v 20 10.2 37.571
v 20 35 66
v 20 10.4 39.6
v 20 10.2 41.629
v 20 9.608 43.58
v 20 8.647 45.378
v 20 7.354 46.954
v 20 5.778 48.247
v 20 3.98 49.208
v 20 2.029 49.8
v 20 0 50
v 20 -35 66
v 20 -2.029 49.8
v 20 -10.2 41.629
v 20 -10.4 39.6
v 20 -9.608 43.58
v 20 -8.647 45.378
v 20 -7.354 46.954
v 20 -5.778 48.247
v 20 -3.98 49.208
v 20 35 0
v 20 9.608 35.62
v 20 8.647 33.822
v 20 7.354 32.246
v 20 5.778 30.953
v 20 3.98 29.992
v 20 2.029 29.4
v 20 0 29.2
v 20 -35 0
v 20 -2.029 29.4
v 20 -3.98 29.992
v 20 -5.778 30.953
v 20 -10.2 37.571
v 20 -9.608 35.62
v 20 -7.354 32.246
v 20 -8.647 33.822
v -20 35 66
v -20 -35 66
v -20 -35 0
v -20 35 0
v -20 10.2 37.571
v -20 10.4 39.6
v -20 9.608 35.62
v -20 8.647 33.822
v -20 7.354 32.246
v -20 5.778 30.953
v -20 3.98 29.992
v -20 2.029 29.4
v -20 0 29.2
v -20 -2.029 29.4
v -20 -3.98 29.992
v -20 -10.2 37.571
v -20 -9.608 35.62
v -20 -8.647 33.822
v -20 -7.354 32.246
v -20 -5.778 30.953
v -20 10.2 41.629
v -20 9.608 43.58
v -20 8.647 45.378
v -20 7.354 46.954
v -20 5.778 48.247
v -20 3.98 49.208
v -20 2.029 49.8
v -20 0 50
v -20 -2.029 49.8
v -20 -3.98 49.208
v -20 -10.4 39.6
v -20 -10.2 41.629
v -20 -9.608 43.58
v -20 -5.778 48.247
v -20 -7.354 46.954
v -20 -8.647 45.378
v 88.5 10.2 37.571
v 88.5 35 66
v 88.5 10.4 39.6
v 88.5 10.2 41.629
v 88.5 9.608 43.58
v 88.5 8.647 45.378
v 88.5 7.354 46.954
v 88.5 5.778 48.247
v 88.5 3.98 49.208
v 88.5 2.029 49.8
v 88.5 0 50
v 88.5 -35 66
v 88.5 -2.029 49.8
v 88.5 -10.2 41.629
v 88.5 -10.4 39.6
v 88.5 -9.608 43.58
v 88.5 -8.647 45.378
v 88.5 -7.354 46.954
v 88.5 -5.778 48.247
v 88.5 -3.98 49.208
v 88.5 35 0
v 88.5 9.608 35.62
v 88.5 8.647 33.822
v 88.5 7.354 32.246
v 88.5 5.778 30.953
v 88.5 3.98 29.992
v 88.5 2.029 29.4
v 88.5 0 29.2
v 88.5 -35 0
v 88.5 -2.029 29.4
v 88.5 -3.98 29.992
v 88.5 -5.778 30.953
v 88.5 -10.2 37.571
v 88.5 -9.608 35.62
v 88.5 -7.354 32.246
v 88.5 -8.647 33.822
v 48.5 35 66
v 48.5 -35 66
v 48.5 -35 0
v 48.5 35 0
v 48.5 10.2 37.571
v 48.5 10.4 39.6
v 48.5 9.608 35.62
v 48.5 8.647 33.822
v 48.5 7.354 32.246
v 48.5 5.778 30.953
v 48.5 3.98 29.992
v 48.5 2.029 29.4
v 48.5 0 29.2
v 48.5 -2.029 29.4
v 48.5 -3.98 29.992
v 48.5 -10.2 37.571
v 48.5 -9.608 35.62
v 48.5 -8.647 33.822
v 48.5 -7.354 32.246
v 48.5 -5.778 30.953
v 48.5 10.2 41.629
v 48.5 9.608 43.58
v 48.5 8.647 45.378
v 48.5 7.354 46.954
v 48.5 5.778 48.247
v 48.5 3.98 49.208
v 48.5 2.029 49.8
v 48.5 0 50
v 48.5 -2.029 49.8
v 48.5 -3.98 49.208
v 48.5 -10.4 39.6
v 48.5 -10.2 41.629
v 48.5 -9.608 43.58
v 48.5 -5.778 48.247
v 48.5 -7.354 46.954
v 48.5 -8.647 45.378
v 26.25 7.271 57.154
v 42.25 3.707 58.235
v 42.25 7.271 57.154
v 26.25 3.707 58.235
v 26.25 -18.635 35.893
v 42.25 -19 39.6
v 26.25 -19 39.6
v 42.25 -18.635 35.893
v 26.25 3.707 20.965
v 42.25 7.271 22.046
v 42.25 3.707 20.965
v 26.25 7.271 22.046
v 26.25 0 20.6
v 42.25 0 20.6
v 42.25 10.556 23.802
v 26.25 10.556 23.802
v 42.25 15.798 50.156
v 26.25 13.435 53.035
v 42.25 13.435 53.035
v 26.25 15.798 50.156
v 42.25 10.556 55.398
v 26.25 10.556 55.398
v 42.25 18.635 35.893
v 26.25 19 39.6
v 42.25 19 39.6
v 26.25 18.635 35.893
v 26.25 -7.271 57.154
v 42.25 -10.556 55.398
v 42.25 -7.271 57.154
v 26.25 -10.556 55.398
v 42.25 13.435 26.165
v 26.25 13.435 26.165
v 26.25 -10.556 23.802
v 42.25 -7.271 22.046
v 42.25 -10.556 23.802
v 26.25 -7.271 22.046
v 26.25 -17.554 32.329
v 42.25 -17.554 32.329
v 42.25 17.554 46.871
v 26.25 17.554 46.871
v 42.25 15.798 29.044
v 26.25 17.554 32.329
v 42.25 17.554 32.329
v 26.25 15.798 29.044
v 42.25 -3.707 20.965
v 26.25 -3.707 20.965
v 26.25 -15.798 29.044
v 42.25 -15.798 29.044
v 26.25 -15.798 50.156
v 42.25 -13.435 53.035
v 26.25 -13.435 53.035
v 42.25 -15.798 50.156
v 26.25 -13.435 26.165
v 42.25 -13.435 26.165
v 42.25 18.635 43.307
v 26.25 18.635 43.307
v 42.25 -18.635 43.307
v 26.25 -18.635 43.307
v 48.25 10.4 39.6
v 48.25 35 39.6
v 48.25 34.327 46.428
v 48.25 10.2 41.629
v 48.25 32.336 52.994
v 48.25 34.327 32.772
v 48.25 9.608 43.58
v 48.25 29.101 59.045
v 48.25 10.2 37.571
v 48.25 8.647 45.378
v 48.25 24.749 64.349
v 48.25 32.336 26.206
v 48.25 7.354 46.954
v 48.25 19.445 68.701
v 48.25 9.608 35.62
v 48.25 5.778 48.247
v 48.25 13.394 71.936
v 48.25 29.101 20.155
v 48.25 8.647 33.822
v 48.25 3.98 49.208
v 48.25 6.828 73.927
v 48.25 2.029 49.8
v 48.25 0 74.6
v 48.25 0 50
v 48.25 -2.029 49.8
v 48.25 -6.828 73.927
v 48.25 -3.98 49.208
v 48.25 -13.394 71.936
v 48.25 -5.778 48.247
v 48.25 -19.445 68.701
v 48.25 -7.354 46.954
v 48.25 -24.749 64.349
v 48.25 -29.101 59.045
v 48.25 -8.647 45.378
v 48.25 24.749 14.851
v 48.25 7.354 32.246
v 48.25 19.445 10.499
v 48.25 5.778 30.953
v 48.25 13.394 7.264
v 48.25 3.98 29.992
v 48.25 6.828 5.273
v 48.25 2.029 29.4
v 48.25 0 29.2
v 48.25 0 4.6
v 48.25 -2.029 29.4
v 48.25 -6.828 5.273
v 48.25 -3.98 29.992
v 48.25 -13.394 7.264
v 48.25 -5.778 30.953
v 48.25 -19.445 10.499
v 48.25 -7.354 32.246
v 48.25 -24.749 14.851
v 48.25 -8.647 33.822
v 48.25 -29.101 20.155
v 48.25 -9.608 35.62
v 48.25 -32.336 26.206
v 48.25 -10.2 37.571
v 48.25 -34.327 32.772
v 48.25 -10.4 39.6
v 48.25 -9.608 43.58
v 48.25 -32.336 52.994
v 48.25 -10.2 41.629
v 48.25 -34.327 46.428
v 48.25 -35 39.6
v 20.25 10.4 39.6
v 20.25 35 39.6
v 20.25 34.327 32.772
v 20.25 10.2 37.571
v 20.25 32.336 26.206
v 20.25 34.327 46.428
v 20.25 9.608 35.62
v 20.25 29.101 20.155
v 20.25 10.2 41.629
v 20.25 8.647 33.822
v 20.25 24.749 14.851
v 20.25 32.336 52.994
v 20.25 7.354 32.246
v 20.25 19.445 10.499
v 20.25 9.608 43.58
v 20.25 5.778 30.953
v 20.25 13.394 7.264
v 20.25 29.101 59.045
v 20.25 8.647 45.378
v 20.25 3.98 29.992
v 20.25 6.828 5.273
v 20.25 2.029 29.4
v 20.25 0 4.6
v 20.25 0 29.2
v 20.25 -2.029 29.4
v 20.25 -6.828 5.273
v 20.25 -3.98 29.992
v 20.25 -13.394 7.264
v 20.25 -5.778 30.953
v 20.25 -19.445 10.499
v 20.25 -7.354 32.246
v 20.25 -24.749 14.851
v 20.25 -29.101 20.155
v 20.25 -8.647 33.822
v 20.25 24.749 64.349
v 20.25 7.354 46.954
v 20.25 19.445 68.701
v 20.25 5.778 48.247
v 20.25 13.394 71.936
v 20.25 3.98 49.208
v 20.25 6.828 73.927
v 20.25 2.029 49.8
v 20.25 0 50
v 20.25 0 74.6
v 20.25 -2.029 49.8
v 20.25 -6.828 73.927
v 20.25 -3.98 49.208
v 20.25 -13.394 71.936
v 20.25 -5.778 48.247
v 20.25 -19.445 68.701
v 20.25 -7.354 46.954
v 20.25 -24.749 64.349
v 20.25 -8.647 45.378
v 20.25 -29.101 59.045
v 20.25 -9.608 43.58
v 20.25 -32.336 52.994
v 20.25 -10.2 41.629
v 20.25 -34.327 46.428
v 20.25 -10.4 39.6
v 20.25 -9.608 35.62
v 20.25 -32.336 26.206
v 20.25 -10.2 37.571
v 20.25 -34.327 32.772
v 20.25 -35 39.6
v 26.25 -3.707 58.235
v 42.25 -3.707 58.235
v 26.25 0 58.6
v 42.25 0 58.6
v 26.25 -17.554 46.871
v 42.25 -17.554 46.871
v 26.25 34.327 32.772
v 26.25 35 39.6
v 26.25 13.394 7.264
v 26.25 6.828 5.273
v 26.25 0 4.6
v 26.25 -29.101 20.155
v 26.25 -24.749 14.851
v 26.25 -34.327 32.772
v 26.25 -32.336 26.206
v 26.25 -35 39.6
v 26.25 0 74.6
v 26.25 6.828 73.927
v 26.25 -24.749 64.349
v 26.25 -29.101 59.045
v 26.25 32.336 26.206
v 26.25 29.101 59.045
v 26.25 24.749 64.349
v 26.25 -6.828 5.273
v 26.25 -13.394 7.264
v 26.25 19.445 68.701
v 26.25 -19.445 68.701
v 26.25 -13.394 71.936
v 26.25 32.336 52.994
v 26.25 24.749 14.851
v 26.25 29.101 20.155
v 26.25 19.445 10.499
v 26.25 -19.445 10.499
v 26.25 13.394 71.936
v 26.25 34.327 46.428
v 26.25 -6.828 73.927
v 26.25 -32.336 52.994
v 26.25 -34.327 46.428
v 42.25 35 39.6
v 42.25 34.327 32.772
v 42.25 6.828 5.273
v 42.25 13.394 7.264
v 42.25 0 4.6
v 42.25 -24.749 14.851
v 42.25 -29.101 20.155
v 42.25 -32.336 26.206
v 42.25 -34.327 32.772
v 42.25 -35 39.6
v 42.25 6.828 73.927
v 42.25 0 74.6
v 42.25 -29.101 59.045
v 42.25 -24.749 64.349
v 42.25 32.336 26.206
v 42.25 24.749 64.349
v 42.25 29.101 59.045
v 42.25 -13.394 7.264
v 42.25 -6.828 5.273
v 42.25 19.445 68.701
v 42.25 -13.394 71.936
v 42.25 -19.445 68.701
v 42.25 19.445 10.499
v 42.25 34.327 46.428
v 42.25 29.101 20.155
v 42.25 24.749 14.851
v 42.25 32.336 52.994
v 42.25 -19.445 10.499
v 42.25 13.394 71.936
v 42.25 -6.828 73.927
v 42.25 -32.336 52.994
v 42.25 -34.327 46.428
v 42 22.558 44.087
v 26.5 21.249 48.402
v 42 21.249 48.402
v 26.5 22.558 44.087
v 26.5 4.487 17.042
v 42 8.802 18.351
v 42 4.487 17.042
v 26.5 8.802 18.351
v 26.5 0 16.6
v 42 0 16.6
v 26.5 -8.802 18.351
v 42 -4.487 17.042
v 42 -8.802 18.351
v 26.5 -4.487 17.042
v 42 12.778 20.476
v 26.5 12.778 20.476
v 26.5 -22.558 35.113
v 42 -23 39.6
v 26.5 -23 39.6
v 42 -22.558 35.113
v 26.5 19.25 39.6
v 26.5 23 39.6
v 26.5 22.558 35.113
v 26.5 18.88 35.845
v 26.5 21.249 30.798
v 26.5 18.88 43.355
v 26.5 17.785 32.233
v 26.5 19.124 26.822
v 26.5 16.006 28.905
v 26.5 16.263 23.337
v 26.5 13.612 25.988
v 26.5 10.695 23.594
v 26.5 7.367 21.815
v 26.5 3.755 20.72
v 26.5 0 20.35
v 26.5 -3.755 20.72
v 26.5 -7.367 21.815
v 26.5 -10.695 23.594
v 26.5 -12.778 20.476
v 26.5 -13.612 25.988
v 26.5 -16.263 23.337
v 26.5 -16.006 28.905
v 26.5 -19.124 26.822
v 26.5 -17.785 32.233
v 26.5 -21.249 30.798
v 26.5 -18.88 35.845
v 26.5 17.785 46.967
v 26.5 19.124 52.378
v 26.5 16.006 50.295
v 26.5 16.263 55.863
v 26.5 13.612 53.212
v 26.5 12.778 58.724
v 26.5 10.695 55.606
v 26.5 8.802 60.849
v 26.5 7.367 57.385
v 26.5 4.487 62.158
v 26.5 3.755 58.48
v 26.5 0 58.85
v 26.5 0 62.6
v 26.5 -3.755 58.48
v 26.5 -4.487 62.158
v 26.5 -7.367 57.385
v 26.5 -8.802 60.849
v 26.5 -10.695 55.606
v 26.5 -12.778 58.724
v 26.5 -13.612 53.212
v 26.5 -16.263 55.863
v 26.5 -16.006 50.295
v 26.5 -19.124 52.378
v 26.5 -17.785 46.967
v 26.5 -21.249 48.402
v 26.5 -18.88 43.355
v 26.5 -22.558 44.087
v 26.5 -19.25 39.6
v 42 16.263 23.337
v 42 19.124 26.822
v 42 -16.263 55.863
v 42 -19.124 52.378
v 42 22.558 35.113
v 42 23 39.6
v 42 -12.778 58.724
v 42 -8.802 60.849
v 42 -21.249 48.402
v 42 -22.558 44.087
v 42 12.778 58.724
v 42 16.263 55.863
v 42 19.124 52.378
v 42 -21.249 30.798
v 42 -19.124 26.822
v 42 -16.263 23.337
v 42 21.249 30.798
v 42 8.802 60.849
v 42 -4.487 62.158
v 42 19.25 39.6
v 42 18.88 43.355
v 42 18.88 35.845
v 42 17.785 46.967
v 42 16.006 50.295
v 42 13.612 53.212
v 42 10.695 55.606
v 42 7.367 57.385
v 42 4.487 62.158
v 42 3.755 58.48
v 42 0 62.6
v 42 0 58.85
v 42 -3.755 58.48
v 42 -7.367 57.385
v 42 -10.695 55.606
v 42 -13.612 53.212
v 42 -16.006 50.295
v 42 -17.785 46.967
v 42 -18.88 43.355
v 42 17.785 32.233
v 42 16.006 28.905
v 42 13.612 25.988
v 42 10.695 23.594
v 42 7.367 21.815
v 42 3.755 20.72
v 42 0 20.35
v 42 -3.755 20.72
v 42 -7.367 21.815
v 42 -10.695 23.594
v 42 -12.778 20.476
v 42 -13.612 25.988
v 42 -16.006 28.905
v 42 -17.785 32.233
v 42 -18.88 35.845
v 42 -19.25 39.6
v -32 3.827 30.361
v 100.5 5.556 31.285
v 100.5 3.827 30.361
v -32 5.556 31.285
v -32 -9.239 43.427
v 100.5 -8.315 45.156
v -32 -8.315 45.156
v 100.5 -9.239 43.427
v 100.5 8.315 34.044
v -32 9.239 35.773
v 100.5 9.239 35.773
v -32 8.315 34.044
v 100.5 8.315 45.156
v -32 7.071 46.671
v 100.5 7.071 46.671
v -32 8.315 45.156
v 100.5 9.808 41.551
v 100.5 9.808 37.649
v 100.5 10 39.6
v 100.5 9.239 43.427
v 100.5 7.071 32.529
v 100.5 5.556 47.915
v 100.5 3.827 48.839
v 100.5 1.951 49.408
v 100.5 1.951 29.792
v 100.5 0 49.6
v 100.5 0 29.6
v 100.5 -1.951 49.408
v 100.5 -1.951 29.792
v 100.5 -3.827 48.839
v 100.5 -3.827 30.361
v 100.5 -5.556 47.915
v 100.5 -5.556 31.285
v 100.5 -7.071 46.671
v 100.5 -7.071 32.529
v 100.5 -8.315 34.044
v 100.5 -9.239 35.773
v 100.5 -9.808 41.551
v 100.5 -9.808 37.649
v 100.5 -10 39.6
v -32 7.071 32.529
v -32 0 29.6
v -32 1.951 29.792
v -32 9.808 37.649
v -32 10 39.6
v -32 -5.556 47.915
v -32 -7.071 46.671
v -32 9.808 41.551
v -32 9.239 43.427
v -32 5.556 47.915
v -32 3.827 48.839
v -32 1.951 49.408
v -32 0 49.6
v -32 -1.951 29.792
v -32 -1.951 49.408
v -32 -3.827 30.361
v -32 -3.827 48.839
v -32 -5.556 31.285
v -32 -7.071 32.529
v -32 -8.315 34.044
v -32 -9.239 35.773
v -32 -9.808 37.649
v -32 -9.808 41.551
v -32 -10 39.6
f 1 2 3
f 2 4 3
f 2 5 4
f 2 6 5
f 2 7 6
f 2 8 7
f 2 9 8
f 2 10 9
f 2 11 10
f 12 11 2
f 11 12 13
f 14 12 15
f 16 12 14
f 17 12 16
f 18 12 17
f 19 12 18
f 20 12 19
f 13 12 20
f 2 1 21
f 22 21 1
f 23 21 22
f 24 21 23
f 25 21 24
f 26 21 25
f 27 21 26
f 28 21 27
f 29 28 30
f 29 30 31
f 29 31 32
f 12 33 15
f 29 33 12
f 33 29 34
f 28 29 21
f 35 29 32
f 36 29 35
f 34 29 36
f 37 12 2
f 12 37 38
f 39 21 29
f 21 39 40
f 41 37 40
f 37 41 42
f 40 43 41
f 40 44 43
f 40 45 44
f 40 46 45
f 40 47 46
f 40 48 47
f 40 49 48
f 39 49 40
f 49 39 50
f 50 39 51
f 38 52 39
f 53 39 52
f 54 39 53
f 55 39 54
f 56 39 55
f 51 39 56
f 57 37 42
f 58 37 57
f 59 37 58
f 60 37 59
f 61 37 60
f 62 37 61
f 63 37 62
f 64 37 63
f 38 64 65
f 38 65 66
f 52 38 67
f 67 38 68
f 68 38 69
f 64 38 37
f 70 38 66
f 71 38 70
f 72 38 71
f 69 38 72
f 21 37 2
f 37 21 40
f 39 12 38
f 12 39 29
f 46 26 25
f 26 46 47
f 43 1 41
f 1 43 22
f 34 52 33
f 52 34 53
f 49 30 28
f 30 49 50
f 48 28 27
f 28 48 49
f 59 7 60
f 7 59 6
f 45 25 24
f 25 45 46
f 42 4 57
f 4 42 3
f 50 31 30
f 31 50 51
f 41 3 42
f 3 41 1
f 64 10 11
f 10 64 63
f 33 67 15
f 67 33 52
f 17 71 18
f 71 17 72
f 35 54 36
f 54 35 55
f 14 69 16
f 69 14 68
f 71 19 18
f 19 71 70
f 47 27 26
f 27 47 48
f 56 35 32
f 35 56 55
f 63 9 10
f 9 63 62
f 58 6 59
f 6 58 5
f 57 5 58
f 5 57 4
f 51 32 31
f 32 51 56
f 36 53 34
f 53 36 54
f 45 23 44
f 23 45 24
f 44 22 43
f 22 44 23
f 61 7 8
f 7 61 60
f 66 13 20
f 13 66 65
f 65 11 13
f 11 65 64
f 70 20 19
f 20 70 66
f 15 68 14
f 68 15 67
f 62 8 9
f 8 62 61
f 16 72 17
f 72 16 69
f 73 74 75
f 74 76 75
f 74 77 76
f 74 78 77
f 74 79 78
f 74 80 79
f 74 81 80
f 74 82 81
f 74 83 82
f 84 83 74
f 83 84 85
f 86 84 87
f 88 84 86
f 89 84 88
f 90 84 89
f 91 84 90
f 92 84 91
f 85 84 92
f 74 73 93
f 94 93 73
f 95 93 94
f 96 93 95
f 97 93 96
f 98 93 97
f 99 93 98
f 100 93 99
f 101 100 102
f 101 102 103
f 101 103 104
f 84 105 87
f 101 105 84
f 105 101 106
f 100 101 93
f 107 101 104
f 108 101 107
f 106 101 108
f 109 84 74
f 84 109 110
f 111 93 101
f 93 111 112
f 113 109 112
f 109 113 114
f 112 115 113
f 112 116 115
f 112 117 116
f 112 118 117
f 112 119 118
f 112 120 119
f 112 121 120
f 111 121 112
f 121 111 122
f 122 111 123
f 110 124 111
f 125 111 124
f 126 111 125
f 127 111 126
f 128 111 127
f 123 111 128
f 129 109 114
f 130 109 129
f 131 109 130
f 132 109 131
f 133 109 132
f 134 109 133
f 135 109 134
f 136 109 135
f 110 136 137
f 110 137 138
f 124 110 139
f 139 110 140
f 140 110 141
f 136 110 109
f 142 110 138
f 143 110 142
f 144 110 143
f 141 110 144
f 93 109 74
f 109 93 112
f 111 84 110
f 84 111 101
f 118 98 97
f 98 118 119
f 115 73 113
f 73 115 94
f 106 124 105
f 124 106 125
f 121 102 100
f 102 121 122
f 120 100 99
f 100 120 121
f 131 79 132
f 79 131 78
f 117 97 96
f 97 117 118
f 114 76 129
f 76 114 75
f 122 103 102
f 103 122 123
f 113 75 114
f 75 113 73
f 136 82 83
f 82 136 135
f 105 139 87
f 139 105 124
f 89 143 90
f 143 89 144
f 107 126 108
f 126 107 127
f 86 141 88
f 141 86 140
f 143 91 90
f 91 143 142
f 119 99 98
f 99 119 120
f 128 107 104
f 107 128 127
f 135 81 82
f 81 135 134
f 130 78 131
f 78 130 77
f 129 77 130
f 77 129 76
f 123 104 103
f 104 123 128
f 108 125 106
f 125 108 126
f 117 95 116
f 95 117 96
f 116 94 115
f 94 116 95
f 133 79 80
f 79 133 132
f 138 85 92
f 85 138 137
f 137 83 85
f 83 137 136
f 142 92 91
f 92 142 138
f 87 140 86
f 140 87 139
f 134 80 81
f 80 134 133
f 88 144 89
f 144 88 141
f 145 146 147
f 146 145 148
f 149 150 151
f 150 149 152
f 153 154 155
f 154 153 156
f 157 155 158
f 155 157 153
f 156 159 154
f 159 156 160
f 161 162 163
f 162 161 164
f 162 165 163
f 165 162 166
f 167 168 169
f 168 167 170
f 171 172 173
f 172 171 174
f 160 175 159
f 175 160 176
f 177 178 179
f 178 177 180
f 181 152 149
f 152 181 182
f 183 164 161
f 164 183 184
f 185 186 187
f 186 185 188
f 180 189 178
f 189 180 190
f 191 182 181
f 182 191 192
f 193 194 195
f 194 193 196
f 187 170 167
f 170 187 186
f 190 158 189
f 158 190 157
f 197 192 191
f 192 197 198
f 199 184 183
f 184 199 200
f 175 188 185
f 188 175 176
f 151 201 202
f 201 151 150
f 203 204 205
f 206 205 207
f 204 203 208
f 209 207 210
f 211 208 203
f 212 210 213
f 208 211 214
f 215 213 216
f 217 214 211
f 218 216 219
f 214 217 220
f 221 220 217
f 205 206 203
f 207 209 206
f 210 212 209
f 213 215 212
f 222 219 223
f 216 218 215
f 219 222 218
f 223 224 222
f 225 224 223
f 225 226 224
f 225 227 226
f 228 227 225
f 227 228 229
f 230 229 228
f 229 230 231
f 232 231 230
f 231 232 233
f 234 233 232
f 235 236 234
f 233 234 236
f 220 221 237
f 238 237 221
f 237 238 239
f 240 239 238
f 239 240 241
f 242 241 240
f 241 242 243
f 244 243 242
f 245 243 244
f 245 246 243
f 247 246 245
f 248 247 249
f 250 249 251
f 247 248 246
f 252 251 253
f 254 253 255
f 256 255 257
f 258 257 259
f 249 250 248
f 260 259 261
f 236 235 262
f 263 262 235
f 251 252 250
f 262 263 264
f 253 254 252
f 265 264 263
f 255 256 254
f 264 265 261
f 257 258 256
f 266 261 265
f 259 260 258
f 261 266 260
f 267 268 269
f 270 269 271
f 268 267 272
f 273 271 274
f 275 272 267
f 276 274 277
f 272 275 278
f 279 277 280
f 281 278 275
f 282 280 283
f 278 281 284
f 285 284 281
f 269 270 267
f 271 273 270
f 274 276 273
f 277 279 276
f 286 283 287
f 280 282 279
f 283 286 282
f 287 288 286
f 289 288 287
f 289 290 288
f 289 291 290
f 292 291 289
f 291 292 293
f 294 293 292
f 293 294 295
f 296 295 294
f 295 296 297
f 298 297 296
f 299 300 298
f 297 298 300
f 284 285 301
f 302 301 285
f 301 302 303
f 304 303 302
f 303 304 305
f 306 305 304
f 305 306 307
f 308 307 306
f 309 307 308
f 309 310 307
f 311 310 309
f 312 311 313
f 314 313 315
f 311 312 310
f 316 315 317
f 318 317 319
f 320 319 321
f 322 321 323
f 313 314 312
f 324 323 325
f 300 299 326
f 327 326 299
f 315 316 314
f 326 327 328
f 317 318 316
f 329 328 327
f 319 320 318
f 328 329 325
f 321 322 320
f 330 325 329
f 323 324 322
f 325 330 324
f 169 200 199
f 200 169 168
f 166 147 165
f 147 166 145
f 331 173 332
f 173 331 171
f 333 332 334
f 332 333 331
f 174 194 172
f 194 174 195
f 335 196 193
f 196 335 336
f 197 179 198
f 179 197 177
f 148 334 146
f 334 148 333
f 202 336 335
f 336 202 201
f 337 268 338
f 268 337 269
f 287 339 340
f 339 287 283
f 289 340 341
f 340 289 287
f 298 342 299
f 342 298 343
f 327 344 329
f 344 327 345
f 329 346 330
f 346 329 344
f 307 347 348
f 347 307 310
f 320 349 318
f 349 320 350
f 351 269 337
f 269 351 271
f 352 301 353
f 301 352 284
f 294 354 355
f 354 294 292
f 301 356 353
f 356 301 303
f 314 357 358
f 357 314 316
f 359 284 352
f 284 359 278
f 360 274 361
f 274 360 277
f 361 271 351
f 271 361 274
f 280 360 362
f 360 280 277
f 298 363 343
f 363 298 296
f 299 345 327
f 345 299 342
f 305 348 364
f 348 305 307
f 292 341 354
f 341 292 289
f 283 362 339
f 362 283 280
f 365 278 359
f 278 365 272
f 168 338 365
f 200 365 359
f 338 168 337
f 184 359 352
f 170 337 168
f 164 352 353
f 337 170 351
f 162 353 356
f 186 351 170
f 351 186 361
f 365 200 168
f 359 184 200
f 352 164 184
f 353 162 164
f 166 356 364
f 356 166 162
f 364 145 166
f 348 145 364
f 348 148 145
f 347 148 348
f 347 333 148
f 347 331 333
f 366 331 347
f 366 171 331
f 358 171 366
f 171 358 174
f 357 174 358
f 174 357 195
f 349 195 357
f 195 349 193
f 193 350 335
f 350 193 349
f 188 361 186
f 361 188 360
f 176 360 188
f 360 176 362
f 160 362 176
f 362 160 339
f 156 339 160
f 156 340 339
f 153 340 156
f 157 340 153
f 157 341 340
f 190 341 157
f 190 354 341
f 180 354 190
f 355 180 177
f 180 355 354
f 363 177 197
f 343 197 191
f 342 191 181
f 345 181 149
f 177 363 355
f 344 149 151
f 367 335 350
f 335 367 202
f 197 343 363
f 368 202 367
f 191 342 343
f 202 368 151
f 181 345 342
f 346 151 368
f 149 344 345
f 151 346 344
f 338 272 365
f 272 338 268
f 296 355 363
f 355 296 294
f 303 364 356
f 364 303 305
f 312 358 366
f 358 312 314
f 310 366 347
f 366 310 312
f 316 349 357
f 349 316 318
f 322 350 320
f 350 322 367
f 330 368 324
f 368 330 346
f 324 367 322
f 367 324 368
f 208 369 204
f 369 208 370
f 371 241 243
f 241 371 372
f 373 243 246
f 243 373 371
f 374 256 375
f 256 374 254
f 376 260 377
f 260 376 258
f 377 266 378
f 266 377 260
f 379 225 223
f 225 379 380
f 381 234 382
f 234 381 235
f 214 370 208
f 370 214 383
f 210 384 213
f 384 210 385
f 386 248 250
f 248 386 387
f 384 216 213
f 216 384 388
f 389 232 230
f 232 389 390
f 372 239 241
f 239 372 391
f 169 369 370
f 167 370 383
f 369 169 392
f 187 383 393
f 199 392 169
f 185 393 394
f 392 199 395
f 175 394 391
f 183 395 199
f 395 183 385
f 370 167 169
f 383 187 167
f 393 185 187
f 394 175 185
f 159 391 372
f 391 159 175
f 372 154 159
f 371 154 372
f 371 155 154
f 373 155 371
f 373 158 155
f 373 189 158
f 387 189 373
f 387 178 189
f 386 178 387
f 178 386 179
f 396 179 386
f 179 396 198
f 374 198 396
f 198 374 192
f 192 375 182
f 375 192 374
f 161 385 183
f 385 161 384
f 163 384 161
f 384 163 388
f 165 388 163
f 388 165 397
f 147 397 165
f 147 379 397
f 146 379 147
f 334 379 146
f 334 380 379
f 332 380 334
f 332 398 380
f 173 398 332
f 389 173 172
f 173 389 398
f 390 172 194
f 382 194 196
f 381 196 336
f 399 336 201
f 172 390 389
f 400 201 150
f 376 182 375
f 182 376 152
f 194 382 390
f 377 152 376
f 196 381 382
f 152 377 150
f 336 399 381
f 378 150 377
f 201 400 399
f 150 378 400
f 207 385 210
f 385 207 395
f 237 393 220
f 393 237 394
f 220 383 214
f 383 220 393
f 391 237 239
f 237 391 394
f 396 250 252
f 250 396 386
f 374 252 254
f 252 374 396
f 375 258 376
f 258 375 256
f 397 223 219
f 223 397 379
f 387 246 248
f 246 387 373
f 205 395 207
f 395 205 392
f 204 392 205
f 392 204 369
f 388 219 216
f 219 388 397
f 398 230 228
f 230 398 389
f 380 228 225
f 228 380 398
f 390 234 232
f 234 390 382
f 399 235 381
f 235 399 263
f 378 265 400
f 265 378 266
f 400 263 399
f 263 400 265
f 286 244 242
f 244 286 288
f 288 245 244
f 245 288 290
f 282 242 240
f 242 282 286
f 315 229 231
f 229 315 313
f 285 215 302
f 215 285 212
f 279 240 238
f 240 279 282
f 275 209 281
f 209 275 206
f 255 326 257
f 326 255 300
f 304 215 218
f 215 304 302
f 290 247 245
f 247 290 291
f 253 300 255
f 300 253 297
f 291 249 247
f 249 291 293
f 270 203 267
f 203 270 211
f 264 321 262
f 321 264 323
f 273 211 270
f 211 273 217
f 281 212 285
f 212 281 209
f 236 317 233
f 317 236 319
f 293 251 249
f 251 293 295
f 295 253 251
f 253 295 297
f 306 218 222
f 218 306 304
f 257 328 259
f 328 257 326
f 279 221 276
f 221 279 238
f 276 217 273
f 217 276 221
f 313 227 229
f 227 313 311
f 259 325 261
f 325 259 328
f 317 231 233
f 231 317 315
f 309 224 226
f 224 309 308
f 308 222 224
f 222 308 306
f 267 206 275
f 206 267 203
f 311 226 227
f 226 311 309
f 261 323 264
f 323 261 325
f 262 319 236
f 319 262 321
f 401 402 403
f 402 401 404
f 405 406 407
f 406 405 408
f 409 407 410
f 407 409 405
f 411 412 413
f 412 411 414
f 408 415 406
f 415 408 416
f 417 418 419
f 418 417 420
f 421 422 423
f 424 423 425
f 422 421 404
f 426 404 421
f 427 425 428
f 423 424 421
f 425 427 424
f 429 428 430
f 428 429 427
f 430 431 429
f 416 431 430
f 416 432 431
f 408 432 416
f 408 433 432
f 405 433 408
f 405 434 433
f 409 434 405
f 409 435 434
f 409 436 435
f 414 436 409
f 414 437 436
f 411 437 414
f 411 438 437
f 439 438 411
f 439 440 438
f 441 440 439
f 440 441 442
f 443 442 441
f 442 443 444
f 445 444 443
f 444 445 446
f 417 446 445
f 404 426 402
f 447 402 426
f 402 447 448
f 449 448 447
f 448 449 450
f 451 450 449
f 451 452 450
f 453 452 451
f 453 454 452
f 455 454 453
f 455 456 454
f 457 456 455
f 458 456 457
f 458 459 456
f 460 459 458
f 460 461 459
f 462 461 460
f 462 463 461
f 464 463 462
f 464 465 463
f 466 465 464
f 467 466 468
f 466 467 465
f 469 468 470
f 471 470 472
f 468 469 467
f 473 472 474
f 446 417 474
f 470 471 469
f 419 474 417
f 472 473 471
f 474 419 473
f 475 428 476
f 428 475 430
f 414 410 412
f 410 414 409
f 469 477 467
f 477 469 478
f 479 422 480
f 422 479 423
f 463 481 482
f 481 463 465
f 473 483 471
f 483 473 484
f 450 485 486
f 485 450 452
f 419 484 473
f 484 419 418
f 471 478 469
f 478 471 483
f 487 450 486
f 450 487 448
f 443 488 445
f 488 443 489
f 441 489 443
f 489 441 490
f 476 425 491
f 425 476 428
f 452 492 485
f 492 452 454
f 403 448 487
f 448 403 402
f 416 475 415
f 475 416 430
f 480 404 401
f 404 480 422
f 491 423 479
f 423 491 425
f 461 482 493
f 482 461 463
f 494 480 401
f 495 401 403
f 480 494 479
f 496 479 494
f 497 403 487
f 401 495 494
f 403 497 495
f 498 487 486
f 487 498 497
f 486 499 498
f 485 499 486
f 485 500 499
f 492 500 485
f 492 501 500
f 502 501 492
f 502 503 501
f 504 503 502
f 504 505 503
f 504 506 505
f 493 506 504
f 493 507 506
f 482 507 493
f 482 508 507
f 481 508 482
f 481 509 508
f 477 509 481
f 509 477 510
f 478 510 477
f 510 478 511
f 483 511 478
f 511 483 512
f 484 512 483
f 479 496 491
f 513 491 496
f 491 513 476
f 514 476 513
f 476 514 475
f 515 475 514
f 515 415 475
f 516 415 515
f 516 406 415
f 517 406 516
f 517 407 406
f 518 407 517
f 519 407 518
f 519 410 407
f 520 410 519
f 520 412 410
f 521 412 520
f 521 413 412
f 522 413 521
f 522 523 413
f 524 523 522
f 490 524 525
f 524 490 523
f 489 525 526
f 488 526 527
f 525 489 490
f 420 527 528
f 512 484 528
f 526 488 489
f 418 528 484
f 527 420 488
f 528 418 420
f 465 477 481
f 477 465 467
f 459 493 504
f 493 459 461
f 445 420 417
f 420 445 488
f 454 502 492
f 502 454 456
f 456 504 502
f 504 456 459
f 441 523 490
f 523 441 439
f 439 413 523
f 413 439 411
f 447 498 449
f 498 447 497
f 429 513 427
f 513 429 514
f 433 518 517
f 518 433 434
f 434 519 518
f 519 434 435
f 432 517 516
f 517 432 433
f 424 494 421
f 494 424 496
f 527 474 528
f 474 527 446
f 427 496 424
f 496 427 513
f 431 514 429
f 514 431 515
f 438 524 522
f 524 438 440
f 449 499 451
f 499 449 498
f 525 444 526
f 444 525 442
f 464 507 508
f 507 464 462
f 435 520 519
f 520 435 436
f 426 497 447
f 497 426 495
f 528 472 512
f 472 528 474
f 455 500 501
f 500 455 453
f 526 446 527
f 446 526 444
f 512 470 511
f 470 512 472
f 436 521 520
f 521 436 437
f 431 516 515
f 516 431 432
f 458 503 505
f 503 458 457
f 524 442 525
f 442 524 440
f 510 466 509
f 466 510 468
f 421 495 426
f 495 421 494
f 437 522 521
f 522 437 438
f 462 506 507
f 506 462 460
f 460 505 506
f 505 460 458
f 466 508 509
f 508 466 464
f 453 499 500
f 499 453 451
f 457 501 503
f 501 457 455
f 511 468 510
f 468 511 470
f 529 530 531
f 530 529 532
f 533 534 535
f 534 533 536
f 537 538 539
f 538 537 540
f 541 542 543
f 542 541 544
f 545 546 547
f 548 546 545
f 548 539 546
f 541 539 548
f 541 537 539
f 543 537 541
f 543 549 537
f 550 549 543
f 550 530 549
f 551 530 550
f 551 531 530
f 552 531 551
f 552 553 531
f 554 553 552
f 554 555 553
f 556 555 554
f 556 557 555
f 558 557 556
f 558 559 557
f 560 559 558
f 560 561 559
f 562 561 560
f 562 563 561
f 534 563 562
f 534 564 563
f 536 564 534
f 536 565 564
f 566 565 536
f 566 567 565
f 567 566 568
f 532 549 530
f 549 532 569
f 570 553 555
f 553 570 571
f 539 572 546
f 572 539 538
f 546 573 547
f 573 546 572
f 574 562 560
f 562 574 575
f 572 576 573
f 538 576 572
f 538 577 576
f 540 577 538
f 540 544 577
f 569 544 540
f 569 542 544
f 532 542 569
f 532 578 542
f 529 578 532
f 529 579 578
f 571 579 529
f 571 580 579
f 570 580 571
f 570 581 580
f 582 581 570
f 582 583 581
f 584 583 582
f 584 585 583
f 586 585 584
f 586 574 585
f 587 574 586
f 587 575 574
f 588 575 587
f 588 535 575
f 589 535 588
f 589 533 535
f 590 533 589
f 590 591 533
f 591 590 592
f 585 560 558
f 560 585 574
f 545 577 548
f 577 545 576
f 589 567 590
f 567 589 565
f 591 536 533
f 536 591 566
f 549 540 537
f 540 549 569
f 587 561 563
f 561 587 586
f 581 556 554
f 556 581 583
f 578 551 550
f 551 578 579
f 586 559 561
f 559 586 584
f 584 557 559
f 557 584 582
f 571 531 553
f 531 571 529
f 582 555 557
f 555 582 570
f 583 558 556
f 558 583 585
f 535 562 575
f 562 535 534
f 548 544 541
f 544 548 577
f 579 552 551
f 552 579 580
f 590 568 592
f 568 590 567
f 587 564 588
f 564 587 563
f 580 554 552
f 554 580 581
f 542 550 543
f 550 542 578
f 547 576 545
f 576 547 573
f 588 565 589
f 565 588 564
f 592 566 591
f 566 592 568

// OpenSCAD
$fn = 32;

// ------------------------------------------------------------------------
// Pulley assembly: d70 pulley with a belt, shaft d20
// Every part is its own module, assembly() places them once.
// ------------------------------------------------------------------------

// --- part 1 ---
module support1() {
  difference() {
    translate([-20, -35, 0]) cube([40, 70, 66]);
    translate([0, 0, 39.6]) rotate([0, 90, 0]) cylinder(h = 42, d = 20.8, center = true);
  }
}

// --- part 2 ---
module support2() {
  difference() {
    translate([-20, -35, 0]) cube([40, 70, 66]);
    translate([0, 0, 39.6]) rotate([0, 90, 0]) cylinder(h = 42, d = 20.8, center = true);
  }
}

// --- part 3 ---
module shaft() {
  translate([0, 0, -66.25]) cylinder(h = 132.5, d = 20);
}

// --- part 4 ---
module pulley() {
  difference() {
    union() {
      cylinder(h = 28, d = 38);
      cylinder(h = 6, d = 70);
      translate([0, 0, 22]) cylinder(h = 6, d = 70);
    }
    translate([0, 0, -1]) cylinder(h = 30, d = 20.8);
  }
}

// --- part 5 ---
module belt() {
  difference() {
      translate([0, 0, 0]) cylinder(h = 15.5, d = 46);
      translate([0, 0, -1]) cylinder(h = 17.5, d = 38.5);
    }
}

// --- assembly ---
module assembly() {
  translate([0, 0, 0]) rotate([0, 0, 0]) support1();
  translate([68.5, 0, 0]) rotate([0, 0, 0]) support2();
  translate([34.25, 0, 39.6]) rotate([0, 90, 0]) shaft();
  translate([20.25, 0, 39.6]) rotate([0, 90, 0]) pulley();
  translate([26.5, 0, 39.6]) rotate([0, 90, 0]) belt();
}

assembly();
